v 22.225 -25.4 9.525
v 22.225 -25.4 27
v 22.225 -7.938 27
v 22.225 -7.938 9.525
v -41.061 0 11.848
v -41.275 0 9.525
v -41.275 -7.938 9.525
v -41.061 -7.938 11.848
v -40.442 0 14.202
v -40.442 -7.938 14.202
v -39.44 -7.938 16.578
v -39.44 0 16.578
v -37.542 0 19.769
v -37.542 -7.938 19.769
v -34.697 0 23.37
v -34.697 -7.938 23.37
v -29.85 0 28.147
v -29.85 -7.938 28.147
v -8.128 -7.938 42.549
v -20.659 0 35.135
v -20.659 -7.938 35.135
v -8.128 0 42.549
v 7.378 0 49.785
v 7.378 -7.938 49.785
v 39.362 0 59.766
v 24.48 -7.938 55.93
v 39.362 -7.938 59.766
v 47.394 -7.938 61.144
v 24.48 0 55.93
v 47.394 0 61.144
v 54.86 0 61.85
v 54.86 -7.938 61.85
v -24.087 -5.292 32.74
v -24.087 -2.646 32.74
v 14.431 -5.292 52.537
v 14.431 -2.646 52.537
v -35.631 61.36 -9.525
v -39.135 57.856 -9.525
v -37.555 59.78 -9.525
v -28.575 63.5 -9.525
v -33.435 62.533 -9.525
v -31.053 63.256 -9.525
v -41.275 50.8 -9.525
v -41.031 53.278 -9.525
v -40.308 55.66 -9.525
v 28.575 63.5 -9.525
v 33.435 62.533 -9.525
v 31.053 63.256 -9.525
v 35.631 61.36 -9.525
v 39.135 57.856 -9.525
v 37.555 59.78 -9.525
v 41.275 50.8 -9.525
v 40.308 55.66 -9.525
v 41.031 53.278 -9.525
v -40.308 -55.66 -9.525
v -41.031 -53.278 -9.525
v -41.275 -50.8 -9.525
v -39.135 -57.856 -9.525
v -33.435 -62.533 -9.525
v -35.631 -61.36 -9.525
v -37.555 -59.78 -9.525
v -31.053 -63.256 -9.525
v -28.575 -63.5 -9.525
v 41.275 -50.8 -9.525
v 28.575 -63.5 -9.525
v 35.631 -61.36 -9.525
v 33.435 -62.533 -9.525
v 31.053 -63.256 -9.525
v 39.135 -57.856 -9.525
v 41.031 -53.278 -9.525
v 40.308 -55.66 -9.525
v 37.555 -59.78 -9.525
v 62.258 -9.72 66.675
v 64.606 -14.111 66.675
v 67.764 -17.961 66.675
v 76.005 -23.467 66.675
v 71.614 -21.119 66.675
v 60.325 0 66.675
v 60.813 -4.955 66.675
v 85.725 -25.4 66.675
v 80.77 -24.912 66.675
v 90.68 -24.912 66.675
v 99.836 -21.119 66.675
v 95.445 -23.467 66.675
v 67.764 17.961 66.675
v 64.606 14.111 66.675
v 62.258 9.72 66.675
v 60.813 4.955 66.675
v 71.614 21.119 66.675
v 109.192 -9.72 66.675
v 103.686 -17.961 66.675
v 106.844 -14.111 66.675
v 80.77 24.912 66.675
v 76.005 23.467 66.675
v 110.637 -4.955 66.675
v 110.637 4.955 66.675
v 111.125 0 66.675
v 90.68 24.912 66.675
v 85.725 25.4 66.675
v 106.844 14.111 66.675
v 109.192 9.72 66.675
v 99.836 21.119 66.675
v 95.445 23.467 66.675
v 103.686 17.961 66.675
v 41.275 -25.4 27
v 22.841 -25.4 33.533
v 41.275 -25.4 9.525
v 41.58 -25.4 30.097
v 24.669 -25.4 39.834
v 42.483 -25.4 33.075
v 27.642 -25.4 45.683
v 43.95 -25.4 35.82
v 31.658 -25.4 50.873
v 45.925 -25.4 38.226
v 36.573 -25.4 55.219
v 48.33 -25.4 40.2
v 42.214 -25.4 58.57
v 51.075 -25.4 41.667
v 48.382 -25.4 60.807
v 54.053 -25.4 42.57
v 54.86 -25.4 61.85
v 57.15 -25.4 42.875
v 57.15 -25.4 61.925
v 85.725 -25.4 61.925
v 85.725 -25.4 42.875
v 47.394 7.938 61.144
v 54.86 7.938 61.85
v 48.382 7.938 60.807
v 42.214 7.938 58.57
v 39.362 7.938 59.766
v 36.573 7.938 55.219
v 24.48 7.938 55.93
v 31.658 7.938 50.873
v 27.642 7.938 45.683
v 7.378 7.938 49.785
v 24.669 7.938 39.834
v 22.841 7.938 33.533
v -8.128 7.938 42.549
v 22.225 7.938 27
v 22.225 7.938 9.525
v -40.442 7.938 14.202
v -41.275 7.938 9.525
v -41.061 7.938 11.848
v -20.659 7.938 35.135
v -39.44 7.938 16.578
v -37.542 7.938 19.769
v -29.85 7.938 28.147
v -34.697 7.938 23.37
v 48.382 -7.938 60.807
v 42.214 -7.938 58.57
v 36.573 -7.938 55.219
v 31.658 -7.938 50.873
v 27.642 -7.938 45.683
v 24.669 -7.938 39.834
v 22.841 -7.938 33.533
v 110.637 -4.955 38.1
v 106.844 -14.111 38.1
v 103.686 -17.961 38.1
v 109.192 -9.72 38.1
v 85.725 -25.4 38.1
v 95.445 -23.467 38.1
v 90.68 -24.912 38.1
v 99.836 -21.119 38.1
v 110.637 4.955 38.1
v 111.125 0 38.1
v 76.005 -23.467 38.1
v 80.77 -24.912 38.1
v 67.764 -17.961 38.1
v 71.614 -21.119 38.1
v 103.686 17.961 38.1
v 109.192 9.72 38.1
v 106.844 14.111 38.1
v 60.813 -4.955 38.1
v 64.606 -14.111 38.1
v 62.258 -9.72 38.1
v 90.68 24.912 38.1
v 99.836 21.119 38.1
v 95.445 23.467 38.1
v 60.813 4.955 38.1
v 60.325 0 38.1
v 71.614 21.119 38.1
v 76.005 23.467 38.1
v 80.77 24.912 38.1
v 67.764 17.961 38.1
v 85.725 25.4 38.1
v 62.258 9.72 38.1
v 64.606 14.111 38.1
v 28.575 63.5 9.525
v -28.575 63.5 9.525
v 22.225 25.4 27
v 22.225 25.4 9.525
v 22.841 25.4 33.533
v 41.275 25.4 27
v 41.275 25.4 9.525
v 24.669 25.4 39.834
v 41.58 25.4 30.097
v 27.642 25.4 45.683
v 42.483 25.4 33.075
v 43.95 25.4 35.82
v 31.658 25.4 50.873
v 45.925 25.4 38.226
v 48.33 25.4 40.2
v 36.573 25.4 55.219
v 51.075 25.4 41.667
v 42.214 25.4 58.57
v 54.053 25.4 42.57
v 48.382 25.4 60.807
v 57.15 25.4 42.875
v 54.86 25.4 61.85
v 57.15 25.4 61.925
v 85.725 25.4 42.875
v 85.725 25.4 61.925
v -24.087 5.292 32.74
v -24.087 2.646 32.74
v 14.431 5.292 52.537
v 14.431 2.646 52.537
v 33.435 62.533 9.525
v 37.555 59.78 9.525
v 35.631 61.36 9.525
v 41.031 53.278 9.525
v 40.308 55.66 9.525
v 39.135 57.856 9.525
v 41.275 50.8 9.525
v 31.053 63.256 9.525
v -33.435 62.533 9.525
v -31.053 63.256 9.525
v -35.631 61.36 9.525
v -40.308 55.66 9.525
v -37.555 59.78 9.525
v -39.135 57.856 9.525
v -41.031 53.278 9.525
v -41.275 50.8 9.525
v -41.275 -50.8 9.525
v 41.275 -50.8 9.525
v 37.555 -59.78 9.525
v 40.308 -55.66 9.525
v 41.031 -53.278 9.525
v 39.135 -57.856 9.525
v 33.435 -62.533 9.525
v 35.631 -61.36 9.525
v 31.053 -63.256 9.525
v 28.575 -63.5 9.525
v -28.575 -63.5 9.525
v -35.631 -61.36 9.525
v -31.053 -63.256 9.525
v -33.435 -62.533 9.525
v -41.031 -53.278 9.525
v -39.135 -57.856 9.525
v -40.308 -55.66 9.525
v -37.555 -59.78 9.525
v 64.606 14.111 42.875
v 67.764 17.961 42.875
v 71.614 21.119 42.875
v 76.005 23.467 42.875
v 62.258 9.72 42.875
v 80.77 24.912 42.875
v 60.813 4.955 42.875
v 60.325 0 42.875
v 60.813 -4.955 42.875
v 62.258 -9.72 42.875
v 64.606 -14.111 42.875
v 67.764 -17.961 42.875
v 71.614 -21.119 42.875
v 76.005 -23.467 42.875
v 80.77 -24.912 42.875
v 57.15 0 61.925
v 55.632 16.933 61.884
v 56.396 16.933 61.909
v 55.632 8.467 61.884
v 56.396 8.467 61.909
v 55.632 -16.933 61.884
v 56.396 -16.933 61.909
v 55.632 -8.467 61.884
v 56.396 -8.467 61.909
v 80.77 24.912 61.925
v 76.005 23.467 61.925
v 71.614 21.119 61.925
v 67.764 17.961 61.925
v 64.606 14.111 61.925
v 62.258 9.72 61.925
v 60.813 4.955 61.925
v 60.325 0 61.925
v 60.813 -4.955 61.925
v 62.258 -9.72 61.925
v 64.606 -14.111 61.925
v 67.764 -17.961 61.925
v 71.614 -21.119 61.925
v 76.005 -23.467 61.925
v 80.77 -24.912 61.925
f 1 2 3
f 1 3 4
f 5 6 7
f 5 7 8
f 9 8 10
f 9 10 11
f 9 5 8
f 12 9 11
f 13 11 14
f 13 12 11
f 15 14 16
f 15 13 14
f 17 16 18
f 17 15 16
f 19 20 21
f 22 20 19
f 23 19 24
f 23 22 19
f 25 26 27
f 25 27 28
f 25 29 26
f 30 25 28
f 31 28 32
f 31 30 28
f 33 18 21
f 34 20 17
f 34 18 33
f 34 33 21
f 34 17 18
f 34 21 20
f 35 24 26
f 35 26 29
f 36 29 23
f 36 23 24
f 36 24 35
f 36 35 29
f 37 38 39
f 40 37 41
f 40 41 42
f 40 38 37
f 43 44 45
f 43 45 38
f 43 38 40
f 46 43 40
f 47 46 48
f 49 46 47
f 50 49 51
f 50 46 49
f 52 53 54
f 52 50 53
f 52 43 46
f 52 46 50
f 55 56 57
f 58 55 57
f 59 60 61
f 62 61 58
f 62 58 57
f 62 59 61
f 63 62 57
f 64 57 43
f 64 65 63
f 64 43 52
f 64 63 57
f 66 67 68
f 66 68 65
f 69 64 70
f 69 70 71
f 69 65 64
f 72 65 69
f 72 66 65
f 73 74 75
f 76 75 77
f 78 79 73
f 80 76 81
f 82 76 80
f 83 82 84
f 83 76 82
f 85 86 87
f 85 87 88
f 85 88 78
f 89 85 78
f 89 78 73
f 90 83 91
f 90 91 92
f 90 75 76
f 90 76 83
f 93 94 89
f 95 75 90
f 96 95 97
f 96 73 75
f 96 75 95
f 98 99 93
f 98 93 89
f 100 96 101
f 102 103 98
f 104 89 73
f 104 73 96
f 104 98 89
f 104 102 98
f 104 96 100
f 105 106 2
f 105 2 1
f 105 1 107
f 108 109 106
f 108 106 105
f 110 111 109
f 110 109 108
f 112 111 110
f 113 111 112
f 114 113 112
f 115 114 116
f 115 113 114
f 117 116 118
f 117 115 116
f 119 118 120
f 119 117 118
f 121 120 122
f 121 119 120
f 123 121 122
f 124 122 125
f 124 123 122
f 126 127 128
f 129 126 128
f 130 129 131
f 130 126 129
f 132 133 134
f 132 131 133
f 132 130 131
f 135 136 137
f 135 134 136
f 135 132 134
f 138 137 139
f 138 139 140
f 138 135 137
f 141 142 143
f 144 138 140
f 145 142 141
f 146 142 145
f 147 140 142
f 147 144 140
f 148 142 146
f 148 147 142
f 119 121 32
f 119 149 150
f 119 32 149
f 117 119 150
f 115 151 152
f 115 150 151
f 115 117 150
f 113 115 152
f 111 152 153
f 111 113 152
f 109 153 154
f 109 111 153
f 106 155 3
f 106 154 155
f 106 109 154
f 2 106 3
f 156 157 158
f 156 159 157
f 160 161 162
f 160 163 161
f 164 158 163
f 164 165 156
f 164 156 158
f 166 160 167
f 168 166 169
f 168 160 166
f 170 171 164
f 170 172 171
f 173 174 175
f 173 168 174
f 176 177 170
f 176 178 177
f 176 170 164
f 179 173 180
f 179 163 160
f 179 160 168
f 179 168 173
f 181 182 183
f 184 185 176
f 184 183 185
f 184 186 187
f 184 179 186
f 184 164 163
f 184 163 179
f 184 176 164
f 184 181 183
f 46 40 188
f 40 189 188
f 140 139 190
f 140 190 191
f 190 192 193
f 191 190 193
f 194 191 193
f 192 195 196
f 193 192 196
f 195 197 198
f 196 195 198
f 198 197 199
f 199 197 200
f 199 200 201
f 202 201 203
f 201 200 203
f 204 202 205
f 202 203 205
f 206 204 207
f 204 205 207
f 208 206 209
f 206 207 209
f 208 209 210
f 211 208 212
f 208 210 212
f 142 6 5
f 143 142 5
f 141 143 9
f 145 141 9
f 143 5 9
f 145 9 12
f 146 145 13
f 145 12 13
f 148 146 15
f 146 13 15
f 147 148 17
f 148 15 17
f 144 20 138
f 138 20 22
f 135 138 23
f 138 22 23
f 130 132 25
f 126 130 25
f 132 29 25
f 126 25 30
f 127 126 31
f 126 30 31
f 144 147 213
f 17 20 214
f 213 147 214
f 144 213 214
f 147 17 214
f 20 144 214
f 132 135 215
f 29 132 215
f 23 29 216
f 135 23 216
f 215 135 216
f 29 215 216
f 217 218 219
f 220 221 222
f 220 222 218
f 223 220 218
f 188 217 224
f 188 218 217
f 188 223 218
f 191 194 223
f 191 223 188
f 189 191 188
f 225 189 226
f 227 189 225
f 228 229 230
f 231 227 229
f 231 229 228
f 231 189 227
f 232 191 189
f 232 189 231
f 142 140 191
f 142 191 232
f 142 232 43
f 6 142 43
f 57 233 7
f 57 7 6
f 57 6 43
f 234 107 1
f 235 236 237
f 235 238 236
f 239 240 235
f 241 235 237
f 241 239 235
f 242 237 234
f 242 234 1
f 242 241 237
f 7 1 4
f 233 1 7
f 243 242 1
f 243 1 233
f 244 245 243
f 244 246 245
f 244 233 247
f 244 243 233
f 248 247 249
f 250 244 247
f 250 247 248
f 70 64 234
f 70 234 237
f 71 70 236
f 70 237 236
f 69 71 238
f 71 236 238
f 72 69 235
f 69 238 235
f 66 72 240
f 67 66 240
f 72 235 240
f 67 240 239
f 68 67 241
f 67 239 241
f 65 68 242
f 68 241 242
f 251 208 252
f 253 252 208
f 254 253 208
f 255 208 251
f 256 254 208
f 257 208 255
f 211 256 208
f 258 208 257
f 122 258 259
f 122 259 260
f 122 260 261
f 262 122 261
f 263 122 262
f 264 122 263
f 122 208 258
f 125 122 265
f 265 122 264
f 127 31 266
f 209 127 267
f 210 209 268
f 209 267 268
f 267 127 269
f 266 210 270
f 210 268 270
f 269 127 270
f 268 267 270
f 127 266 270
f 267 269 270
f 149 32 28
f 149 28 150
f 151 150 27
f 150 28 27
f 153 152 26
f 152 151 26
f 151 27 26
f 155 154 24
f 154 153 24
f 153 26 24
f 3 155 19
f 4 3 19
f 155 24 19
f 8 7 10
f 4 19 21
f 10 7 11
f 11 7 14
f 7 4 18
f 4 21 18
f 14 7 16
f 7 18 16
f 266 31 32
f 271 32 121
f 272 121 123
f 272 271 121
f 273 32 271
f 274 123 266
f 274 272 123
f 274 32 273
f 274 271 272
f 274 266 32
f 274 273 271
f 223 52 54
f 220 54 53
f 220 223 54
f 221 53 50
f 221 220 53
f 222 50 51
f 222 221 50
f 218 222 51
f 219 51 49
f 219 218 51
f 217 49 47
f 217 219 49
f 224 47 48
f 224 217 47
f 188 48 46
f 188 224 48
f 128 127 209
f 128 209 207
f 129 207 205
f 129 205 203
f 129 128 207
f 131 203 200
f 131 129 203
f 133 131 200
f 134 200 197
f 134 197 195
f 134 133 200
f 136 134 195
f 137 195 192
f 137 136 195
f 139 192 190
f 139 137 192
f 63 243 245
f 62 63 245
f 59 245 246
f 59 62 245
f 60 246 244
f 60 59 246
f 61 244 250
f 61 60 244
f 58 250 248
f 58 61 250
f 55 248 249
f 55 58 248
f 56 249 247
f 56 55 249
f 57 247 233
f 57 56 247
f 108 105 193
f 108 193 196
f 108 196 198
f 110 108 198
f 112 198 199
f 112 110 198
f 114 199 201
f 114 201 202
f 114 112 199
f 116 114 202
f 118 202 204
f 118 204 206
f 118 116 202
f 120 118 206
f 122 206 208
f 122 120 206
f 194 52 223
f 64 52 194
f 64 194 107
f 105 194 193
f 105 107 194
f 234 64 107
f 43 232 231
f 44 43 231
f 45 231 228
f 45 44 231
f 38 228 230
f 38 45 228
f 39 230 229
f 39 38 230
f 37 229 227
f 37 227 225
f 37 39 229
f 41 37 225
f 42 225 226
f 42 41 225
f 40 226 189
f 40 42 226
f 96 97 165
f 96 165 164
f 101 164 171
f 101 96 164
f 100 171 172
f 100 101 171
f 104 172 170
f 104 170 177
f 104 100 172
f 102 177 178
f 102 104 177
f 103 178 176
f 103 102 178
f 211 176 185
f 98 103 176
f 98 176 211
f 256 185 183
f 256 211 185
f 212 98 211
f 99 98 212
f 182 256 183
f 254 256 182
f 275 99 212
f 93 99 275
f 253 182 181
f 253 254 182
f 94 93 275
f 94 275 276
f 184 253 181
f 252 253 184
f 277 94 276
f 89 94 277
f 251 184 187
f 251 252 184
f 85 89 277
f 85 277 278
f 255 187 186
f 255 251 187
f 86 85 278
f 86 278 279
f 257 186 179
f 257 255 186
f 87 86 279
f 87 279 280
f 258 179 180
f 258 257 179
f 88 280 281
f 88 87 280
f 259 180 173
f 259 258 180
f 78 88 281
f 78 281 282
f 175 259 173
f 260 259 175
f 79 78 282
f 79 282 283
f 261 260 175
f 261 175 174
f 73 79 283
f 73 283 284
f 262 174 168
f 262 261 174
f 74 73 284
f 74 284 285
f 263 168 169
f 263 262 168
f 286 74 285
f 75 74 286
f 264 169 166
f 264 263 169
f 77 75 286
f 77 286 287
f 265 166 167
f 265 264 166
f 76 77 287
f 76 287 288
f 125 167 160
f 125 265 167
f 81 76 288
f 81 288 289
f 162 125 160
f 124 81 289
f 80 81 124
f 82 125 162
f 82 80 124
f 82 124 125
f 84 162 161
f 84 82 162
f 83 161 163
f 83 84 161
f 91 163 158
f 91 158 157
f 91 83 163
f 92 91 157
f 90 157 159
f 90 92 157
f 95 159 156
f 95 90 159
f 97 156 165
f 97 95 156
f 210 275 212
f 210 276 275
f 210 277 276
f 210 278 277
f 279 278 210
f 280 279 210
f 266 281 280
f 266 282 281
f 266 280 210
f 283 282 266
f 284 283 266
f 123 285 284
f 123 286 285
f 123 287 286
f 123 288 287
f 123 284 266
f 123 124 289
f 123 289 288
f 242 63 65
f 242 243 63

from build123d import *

# Parameters (mm, degrees)
F1_DEPTH = 63.5
F2_DEPTH = 25.4
F3_DEPTH = 7.9375
F5_R     = 12.7


with BuildPart() as f1:
    # F0 (on Front) → F1 (new body, symmetric)
    with BuildSketch(Plane.XZ):
        Polygon((-41.275, 9.525), (-41.275, -9.525), (41.275, -9.525), (41.275, 9.525), (22.225, 9.525), align=None)
    extrude(amount=F1_DEPTH, both=True)

    # F0 (on Front) → F2 (join, symmetric)
    with BuildSketch(Plane.XZ):
        Polygon((85.725, 61.9252), (60.325, 61.9252), (60.325, 42.8752), (85.725, 42.8752), (85.725, 52.3875), align=None)
        with BuildLine():
            Line((22.225, 9.525), (41.275, 9.525))
            Line((41.275, 9.525), (41.275, 27.0002))
            ThreePointArc((41.275, 27.0002), (45.9246798487, 38.2255201513), (57.15, 42.8752))
            Line((57.15, 42.8752), (60.325, 42.8752))
            Line((60.325, 42.8752), (60.325, 61.9252))
            Line((60.325, 61.9252), (57.15, 61.9252))
            add(Edge.make_bspline(
                [(54.8603183175, 61.8500634544), (55.6368577233, 61.8882476927), (56.4004054697, 61.9134098157), (57.15, 61.9252)],
                knots=[109.0783703801, 109.0783703801, 109.0783703801, 109.0783703801, 111.5045361635, 111.5045361635, 111.5045361635, 111.5045361635], degree=3))
            ThreePointArc((54.8603183175, 61.8500634544), (31.6576211608, 50.8726578986), (22.225, 27.0002))
            Line((22.225, 27.0002), (22.225, 9.525))
        make_face()
    extrude(amount=F2_DEPTH, both=True)

    # F0 (on Front) → F3 (join, symmetric)
    with BuildSketch(Plane.XZ):
        with BuildLine():
            add(Edge.make_bspline(
                [(-41.275, 9.525), (-41.2251744093, 32.0946626857), (19.9477606111, 60.1333322619), (54.8603183175, 61.8500634544)],
                knots=[0, 0, 0, 0, 109.0783703801, 109.0783703801, 109.0783703801, 109.0783703801], degree=3))
            Line((-41.275, 9.525), (22.225, 9.525))
            Line((22.225, 9.525), (22.225, 27.0002))
            ThreePointArc((22.225, 27.0002), (31.6576211608, 50.8726578986), (54.8603183175, 61.8500634544))
        make_face()
    extrude(amount=F3_DEPTH, both=True)

    # F0 (on Front) → F4 (revolve)
    with BuildSketch(Plane.XZ):
        Polygon((85.725, 66.675), (85.725, 61.9252), (85.725, 52.3875), (85.725, 42.8752), (85.725, 38.1), (111.125, 38.1), (111.125, 66.675), align=None)
    revolve(axis=Axis((85.725, 0, 45.24375), (0, 0, 1)))

    # F5
    f5_edges = [f1.edges().sort_by_distance(p)[0] for p in [
        (41.275, -63.5, 0),
        (-41.275, -63.5, 0),
        (41.275, 63.5, 0),
        (-41.275, 63.5, 0),
    ]]
    fillet(f5_edges, radius=F5_R)


solid = f1.part
